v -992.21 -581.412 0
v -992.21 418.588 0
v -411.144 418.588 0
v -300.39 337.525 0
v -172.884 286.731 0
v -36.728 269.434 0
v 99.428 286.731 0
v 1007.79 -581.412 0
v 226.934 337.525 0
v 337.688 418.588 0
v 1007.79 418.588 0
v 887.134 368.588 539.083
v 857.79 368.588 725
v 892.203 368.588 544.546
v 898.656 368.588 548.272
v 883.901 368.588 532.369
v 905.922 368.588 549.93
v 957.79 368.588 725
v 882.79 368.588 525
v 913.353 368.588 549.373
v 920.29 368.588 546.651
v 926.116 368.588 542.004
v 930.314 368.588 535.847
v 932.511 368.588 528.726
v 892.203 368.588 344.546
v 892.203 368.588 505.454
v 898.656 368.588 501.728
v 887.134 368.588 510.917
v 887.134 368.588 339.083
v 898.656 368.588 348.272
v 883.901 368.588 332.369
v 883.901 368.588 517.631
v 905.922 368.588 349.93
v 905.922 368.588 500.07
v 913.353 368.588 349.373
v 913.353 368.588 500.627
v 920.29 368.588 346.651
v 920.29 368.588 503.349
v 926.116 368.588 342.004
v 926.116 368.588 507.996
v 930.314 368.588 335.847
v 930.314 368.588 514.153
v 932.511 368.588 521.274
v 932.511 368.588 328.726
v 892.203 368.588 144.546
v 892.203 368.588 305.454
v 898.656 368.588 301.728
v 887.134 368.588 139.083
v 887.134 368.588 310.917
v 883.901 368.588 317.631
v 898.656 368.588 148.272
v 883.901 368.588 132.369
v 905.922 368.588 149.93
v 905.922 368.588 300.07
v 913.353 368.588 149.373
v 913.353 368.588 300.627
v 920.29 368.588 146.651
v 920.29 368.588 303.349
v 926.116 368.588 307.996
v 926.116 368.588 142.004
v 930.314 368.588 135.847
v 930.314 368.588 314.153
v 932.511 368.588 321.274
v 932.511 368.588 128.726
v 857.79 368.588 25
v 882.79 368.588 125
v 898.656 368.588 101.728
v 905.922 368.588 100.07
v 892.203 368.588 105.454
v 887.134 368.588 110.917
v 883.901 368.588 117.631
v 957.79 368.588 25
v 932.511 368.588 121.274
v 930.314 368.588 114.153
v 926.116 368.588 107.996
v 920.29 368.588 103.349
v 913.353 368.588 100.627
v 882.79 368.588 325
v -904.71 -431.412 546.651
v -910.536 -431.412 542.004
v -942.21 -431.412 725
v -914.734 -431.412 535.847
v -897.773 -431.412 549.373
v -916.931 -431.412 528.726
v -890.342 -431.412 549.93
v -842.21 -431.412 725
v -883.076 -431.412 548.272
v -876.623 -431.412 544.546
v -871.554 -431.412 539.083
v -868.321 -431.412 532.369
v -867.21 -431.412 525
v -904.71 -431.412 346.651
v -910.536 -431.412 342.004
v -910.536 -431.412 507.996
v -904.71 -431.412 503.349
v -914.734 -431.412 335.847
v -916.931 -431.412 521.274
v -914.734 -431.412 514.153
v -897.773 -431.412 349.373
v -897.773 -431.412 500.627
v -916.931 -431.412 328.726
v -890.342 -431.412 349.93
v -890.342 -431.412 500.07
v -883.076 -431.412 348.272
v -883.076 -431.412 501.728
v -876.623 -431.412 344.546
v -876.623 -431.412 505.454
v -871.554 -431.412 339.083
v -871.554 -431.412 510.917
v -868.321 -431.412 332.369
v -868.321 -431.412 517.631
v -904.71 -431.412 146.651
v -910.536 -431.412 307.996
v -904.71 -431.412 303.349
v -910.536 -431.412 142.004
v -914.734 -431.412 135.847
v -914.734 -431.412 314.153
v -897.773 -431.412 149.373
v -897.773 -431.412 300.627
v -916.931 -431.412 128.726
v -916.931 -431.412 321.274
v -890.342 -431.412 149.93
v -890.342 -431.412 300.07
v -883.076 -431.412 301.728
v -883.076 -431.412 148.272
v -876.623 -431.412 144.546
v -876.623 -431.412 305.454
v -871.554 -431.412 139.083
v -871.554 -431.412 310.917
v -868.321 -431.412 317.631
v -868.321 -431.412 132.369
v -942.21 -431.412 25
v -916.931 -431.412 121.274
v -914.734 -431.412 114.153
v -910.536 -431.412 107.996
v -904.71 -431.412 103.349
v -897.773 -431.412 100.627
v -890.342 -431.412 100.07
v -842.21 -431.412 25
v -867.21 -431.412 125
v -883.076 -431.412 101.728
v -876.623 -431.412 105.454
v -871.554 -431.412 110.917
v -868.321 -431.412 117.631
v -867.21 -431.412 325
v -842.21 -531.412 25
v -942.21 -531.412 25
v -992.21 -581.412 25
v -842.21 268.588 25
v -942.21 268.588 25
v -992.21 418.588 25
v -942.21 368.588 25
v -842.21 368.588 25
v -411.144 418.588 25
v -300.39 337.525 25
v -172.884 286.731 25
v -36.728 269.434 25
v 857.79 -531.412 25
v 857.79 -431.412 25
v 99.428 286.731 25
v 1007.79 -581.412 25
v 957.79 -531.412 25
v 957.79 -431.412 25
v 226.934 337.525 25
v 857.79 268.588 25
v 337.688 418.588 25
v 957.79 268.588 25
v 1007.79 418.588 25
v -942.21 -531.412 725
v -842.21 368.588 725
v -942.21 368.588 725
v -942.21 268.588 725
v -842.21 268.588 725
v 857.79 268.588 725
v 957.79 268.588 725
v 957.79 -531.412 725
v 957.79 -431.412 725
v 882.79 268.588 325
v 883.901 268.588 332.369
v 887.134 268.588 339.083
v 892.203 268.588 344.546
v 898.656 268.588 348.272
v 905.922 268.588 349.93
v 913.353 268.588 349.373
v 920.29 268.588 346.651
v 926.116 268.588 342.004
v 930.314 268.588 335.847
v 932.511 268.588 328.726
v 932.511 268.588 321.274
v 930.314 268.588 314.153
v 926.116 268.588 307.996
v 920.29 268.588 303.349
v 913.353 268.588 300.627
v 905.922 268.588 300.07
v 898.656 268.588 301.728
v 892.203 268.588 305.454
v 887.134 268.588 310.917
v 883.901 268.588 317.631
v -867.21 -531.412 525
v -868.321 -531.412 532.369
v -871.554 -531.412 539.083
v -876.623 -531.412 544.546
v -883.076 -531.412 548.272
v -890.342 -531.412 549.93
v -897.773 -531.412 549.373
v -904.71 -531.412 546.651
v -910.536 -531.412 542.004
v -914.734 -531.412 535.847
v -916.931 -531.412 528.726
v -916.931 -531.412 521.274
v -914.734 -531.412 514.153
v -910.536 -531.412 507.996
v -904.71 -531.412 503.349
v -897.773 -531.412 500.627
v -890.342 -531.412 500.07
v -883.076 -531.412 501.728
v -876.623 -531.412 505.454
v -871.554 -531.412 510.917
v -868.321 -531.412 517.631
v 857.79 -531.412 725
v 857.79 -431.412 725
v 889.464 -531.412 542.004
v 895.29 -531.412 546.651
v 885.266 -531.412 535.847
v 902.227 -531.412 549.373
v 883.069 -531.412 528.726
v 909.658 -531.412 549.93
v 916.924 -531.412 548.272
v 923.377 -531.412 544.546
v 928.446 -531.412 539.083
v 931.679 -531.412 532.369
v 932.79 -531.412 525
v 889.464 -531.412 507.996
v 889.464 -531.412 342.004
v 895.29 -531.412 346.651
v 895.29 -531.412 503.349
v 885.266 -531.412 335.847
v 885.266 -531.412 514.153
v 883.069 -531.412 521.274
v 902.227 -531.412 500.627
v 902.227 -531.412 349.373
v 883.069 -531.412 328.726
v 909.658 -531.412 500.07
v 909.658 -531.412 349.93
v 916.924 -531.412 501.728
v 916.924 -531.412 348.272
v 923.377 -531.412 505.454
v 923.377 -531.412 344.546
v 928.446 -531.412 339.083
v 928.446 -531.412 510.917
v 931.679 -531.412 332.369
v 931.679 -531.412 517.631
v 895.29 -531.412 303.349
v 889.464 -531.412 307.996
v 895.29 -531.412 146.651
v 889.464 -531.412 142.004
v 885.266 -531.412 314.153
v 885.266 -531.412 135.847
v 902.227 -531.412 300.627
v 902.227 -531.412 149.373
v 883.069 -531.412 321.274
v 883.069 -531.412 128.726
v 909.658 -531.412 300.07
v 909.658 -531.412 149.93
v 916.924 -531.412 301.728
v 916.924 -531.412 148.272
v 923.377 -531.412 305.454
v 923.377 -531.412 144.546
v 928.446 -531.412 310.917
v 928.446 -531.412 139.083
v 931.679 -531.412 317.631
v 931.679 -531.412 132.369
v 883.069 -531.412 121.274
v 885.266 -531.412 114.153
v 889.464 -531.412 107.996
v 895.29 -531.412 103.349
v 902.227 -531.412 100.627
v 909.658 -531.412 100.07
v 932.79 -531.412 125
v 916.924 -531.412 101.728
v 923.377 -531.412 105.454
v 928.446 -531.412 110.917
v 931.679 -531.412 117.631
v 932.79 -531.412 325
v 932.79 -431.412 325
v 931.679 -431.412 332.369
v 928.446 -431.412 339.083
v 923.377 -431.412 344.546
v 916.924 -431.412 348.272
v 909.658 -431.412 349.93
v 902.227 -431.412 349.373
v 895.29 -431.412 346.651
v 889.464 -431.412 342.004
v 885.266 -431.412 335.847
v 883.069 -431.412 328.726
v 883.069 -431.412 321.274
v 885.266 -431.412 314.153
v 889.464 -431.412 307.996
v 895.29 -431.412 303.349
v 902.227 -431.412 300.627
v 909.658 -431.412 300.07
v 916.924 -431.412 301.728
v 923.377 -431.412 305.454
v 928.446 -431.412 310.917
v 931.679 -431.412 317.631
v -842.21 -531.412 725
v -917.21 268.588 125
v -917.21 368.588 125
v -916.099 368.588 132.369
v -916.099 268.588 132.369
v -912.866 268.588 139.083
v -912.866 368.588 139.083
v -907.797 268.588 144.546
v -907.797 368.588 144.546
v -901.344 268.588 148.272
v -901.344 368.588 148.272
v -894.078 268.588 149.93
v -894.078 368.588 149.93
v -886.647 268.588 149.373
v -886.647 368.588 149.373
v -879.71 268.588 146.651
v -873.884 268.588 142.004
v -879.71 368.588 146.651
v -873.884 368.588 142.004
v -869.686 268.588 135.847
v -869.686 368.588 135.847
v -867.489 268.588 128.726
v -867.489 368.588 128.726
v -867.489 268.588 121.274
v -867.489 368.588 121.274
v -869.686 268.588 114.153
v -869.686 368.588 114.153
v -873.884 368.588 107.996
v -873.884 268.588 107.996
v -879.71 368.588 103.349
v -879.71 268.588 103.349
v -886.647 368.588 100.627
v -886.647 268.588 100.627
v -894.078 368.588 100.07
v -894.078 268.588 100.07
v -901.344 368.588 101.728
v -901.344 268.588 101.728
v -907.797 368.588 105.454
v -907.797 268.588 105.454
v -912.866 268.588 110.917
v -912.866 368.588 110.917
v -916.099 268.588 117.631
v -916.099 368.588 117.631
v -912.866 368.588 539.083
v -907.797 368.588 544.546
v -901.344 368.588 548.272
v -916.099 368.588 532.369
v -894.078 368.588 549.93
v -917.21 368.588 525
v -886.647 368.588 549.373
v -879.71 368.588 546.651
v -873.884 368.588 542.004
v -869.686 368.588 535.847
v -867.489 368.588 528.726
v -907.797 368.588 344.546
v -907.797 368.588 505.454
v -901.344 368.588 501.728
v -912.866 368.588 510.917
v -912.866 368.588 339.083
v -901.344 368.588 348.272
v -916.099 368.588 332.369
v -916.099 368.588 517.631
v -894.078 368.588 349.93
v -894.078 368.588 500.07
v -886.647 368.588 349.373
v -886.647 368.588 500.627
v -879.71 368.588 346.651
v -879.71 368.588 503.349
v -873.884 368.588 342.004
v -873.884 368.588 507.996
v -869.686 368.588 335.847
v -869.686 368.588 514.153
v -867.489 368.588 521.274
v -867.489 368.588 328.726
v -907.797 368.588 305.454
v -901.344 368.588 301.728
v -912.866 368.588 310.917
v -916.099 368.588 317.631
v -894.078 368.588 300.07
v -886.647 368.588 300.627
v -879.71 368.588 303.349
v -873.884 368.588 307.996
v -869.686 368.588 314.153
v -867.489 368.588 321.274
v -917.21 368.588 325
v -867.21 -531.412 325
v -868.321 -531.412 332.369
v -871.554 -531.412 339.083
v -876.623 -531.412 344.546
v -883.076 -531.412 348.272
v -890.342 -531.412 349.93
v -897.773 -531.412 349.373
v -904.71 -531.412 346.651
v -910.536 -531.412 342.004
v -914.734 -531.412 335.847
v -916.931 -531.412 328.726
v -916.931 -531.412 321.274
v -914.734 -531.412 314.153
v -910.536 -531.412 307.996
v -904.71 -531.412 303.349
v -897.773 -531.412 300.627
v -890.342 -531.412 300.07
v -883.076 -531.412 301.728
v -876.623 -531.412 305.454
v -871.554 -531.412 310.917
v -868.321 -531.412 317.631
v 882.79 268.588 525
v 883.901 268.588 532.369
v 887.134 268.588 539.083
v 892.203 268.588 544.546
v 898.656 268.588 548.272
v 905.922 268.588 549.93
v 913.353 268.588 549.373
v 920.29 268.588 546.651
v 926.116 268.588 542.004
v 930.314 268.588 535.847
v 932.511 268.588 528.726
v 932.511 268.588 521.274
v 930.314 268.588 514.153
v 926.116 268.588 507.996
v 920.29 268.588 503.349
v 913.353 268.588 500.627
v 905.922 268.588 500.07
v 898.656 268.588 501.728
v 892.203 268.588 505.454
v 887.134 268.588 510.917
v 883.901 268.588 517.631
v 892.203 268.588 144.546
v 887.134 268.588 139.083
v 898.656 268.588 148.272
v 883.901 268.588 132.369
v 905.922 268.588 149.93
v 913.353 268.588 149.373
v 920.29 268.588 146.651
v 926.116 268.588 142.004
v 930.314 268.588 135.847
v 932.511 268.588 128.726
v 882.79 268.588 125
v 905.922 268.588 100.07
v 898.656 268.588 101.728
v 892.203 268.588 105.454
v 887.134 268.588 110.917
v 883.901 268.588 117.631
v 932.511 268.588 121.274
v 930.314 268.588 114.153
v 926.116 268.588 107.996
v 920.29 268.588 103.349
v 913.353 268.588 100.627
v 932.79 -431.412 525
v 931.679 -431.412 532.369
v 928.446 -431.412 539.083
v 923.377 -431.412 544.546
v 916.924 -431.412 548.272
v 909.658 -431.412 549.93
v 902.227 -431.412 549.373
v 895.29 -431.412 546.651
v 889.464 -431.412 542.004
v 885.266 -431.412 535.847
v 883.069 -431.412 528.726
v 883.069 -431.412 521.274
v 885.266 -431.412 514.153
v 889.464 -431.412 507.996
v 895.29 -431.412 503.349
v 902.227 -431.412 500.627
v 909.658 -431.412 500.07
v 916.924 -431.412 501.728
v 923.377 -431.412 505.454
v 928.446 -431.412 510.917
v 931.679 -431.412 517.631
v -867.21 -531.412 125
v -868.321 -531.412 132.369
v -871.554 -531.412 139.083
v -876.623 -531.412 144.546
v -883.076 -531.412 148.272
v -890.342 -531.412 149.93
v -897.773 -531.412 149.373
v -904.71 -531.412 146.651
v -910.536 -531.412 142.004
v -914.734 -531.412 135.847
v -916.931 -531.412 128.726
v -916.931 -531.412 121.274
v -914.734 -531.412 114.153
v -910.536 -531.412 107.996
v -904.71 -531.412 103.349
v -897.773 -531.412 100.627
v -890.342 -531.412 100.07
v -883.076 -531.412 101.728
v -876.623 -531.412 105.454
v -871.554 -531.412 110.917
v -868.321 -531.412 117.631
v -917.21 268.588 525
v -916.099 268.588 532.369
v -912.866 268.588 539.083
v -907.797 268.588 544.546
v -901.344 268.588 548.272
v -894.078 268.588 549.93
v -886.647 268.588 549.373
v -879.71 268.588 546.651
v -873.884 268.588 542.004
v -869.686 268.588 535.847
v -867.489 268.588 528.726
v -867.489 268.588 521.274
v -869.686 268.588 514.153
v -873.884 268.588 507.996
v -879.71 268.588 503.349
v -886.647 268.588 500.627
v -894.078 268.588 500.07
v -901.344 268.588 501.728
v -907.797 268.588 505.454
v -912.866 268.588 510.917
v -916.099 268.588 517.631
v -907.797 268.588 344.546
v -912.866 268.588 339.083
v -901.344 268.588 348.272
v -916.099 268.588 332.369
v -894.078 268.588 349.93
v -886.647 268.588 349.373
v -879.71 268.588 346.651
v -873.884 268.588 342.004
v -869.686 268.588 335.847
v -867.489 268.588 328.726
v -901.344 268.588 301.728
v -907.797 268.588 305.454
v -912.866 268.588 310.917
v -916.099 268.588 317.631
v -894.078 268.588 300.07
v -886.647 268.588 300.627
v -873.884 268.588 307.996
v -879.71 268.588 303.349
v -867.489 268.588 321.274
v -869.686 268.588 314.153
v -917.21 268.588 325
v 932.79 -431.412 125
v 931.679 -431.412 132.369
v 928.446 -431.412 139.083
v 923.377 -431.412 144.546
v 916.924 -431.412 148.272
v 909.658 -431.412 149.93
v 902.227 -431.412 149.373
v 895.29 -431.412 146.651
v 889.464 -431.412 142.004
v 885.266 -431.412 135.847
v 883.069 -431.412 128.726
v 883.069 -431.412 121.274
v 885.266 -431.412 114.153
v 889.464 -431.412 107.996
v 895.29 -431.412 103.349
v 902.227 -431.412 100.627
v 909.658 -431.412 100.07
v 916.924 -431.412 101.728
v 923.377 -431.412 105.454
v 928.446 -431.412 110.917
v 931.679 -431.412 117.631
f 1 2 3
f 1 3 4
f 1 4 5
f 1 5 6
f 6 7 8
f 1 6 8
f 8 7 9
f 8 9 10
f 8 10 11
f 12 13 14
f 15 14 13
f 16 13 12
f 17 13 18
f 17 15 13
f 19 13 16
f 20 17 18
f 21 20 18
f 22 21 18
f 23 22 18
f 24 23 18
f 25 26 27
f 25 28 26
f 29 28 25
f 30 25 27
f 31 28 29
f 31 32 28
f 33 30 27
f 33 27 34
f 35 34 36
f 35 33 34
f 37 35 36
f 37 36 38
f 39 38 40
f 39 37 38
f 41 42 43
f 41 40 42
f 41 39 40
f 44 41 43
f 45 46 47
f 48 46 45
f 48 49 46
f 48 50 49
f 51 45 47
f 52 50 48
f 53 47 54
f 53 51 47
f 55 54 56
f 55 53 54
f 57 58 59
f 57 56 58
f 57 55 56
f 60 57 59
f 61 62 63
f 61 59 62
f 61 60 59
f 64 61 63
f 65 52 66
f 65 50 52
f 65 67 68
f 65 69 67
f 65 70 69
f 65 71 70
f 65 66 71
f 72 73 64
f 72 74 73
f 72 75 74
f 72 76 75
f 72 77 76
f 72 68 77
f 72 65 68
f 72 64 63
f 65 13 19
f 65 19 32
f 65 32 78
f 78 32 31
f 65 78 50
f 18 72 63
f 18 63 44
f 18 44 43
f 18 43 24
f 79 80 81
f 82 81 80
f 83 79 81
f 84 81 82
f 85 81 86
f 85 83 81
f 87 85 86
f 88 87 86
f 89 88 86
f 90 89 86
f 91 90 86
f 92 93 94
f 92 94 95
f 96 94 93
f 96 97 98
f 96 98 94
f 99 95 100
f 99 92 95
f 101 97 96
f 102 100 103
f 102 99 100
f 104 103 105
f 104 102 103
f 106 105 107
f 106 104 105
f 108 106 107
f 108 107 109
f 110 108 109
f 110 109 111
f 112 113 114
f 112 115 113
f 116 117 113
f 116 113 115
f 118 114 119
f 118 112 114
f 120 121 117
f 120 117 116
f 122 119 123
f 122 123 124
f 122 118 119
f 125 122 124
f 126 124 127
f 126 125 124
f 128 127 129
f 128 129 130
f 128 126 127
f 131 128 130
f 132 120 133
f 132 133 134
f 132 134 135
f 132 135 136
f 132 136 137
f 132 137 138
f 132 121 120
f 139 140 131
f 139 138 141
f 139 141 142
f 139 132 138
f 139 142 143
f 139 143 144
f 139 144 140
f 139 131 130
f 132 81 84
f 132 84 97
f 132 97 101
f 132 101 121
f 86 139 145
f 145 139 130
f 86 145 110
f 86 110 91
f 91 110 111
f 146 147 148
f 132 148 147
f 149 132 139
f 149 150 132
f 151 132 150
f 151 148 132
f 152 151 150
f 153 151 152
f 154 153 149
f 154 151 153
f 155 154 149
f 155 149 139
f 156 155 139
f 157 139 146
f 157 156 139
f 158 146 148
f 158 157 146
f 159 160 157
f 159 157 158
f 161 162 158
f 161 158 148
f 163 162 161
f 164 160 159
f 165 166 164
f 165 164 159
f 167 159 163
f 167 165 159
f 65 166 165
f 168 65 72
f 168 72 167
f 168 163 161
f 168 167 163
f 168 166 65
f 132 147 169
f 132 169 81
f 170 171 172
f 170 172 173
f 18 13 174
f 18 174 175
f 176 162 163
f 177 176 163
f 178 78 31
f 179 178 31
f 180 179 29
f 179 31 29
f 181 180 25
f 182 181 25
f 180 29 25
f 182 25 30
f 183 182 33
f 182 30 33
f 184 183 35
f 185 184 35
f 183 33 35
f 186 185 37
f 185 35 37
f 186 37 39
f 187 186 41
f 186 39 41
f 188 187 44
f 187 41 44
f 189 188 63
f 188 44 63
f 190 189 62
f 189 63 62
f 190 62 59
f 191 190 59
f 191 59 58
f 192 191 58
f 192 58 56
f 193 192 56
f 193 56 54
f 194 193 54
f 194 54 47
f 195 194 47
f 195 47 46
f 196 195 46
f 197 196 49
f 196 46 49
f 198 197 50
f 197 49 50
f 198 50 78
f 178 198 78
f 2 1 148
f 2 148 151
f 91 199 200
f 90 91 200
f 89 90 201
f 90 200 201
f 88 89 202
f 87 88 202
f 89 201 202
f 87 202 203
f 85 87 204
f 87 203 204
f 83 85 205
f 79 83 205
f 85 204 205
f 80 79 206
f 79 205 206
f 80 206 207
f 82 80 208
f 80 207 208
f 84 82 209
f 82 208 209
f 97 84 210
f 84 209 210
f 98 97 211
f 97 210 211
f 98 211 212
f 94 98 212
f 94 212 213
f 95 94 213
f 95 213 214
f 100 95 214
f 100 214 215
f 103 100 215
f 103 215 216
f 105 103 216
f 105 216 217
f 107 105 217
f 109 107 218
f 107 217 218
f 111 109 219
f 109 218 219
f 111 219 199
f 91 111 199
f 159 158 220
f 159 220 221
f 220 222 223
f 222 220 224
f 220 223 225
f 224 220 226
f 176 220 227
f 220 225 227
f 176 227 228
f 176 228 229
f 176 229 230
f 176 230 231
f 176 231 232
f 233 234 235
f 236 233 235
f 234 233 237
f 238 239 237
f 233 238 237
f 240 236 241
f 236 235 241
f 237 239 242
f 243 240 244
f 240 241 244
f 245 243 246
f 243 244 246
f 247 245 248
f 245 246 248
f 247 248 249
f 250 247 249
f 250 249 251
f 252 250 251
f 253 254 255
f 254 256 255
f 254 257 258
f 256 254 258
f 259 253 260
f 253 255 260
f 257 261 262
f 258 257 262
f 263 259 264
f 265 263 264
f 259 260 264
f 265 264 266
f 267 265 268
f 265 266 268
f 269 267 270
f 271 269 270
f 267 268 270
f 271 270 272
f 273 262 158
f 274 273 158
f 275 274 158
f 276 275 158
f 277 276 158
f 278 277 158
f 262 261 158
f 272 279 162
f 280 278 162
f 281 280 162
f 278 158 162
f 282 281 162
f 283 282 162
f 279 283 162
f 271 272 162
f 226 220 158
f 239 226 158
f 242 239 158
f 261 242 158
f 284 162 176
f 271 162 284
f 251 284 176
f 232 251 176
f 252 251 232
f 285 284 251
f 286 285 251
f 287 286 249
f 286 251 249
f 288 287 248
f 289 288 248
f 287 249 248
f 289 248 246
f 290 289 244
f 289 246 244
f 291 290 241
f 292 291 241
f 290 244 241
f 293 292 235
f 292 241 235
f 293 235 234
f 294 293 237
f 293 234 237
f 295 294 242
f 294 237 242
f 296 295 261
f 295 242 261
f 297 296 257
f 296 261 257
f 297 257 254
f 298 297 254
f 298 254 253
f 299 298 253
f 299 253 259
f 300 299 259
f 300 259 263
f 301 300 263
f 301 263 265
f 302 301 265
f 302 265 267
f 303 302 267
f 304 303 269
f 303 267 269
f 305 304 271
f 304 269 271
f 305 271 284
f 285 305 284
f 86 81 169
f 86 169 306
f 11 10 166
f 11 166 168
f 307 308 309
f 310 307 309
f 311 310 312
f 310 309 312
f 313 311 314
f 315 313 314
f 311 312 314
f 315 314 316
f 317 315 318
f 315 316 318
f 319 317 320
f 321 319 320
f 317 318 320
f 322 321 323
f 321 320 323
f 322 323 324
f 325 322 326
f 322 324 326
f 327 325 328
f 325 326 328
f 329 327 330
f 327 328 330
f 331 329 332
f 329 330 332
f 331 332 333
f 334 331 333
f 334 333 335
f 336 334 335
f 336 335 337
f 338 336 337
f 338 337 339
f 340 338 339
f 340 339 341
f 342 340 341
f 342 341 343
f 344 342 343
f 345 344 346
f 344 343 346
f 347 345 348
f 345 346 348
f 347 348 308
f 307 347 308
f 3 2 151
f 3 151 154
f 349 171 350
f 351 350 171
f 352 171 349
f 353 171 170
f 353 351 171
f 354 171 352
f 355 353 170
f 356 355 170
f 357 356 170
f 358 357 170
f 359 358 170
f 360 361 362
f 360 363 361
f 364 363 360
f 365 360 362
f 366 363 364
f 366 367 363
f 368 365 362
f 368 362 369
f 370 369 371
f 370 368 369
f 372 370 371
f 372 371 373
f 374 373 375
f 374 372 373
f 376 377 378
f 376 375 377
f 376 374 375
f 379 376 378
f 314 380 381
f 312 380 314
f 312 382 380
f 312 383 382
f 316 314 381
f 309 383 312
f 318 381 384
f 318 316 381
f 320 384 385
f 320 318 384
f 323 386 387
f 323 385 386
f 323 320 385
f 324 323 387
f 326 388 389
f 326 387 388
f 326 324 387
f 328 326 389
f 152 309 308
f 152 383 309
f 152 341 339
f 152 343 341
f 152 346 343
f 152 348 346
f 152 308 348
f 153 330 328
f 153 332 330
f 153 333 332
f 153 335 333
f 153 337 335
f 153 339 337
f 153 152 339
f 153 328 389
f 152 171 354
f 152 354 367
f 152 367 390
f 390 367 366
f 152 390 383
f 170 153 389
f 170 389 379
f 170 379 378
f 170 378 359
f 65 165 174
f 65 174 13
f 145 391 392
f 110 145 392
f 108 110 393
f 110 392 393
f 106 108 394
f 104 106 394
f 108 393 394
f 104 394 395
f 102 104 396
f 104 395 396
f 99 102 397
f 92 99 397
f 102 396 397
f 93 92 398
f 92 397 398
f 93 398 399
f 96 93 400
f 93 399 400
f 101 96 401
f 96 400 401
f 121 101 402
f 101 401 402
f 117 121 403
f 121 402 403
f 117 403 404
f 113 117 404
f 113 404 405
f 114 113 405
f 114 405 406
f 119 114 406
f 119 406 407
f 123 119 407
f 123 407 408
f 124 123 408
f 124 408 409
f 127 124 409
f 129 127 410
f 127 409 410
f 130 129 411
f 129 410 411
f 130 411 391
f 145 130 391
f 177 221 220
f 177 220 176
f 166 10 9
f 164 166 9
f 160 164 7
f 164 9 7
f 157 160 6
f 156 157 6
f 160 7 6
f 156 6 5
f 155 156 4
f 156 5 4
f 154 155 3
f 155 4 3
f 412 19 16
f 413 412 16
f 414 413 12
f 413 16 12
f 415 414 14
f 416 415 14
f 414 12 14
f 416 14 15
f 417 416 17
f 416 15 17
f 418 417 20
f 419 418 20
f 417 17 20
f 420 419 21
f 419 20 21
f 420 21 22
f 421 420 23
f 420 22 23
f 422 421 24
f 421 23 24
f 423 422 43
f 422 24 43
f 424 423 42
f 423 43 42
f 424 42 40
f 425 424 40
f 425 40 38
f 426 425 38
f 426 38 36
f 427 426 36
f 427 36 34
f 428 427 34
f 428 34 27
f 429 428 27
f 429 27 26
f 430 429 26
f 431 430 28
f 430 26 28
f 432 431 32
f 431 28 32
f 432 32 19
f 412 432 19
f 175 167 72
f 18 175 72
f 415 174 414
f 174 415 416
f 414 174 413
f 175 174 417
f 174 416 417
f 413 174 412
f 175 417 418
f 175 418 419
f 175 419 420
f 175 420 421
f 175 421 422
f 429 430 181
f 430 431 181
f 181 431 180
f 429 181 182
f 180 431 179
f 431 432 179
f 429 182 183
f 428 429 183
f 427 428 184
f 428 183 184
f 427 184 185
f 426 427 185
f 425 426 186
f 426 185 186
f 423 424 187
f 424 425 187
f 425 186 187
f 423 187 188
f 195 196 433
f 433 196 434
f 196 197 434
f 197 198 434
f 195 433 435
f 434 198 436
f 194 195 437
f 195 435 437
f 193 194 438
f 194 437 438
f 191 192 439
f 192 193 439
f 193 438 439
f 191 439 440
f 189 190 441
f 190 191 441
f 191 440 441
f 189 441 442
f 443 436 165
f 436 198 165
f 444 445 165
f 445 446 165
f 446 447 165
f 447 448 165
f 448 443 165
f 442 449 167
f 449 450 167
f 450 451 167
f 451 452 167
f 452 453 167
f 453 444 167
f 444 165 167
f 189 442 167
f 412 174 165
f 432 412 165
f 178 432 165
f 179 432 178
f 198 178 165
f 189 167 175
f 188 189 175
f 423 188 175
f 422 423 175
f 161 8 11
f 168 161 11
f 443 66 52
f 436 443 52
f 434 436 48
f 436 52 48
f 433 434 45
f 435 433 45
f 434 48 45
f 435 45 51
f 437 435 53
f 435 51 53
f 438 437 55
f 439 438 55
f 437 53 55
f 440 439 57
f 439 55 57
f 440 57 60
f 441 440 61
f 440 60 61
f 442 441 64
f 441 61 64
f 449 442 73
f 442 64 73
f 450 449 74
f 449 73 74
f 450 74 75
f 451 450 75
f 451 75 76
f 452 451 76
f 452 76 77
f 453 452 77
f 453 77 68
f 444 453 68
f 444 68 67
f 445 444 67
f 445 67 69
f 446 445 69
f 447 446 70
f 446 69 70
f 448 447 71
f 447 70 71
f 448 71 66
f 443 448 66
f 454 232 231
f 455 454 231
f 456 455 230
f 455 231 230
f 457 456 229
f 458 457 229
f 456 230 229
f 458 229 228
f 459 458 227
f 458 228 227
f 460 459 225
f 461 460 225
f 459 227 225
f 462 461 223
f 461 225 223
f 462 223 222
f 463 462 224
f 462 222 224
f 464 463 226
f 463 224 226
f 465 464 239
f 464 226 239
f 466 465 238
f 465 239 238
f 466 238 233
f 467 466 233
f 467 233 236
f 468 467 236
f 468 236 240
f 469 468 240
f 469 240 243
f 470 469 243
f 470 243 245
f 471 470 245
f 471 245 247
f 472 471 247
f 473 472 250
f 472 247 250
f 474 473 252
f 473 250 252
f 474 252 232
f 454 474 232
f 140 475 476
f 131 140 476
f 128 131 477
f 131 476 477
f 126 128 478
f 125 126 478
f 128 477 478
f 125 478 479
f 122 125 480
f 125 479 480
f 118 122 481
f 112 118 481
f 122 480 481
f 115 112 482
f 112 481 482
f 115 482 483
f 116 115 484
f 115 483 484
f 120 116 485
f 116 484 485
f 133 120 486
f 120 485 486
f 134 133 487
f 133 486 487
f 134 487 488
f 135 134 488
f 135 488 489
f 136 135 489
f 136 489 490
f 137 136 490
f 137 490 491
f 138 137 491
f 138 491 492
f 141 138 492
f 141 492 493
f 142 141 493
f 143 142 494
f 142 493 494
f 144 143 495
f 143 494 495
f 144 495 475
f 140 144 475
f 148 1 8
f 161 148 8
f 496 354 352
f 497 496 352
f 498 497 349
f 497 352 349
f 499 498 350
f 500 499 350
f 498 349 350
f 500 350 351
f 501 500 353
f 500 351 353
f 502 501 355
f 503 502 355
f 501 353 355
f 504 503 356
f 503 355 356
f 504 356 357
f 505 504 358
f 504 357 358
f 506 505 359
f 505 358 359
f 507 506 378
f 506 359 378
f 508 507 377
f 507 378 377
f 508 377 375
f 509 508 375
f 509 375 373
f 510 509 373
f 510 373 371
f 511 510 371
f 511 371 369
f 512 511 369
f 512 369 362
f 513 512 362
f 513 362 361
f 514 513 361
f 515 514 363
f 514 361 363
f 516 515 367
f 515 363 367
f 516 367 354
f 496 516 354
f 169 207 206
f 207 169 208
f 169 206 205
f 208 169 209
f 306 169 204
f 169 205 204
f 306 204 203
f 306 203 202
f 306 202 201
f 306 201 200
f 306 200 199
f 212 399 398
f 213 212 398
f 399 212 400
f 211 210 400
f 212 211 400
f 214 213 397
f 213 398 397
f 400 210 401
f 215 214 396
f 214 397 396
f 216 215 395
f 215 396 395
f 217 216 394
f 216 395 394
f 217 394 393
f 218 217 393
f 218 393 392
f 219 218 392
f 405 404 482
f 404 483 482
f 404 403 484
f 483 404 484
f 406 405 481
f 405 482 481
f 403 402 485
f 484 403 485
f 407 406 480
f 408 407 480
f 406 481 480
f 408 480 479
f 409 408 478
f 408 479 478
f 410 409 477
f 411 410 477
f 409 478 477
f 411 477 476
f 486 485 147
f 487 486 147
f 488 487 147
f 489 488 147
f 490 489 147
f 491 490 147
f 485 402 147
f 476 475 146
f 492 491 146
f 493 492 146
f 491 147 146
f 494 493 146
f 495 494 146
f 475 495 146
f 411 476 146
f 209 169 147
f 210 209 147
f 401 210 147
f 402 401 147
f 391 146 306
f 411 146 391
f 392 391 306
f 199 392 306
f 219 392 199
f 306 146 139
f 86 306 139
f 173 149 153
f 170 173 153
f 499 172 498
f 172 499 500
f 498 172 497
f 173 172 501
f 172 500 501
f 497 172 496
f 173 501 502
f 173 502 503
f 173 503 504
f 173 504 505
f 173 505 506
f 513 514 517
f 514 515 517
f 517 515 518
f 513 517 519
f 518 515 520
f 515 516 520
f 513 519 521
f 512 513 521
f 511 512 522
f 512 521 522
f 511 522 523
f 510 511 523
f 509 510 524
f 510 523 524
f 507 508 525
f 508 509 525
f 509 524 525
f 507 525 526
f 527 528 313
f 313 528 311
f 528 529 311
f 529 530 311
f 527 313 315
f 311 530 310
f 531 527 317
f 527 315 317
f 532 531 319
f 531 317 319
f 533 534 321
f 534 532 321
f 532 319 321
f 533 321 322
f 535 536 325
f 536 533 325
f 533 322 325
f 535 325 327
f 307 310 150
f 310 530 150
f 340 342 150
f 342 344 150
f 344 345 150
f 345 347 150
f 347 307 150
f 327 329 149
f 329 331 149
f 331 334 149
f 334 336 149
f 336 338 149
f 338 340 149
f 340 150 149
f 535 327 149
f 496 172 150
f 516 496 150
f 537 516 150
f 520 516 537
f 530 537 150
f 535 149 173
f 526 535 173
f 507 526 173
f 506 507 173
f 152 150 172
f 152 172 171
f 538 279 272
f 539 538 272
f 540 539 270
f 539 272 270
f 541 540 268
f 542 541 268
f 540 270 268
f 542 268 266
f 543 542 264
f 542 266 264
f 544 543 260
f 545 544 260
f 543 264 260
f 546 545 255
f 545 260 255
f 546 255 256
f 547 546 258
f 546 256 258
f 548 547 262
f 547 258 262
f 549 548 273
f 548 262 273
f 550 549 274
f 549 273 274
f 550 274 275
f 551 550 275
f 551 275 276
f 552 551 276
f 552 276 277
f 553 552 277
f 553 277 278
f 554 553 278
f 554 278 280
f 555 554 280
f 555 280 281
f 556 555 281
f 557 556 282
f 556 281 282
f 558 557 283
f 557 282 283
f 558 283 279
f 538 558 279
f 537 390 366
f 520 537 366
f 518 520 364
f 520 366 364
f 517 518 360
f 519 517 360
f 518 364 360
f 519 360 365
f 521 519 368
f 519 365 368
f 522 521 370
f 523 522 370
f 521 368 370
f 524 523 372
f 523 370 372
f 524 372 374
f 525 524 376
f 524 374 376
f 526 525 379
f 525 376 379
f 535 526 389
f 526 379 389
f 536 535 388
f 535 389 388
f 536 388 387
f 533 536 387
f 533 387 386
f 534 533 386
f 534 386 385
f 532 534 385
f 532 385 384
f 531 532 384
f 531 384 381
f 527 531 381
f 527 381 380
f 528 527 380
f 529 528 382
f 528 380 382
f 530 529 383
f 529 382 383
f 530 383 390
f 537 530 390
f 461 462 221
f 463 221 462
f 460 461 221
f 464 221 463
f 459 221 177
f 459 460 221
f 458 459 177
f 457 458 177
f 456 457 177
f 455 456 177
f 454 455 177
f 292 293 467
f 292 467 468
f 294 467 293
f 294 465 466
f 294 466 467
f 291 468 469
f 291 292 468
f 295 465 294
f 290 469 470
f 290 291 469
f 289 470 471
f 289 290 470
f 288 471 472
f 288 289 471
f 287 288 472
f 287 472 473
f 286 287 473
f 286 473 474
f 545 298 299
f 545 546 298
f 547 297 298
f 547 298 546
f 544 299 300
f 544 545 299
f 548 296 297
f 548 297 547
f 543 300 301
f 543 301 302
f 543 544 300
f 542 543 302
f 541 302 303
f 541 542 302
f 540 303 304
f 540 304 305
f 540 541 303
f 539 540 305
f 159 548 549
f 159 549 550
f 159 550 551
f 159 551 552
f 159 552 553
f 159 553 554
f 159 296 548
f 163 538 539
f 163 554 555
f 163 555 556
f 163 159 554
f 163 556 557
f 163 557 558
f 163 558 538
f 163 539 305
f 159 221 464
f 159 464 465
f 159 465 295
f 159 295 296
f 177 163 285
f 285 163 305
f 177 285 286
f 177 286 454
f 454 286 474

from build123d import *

# Parameters (mm, degrees)
F0_W      = 2000
F0_H      = 1000
F1_DEPTH  = 25
F2_W      = 100
F2_H      = 100
F3_DEPTH  = 700
F4_R      = 25
F5_DEPTH  = 100
F6_W      = 100
F6_H      = 100
F7_DEPTH  = 700
F8_R      = 25
F9_DEPTH  = 100
F10_W     = 100
F10_H     = 100
F11_DEPTH = 700
F12_R     = 25
F13_DEPTH = 100
F14_W     = 100
F14_H     = 100
F15_DEPTH = 700
F16_R     = 25
F17_DEPTH = 100
F19_DEPTH = 25


with BuildPart() as f1:
    # F0 (on Top) → F1 (new body)
    with BuildSketch(Plane.XY):
        with Locations((7.790016, -81.412016)):
            Rectangle(F0_W, F0_H)
    extrude(amount=F1_DEPTH)

    # F2 (on face) → F3 (join)
    with BuildSketch(Plane.XY.offset(25)):
        with Locations((-892.209984, 318.587984)):
            Rectangle(F2_W, F2_H)
    extrude(amount=F3_DEPTH)

    # F4 (on face) → F5 (cut)
    with BuildSketch(Plane(origin=(0, 368.587984, 0), x_dir=(-1, 0, 0), z_dir=(0, 1, 0))):
        with Locations((892.209984, 125)):
            Circle(F4_R)
        with Locations((892.209984, 325)):
            Circle(F4_R)
        with Locations((892.209984, 525)):
            Circle(F4_R)
    extrude(amount=-F5_DEPTH, mode=Mode.SUBTRACT)

    # F6 (on face) → F7 (join)
    with BuildSketch(Plane.XY.offset(25)):
        with Locations((907.790016, 318.587984)):
            Rectangle(F6_W, F6_H)
    extrude(amount=F7_DEPTH)

    # F8 (on face) → F9 (cut)
    with BuildSketch(Plane(origin=(0, 368.587984, 0), x_dir=(-1, 0, 0), z_dir=(0, 1, 0))):
        with Locations((-907.790016, 125)):
            Circle(F8_R)
        with Locations((-907.790016, 325)):
            Circle(F8_R)
        with Locations((-907.790016, 525)):
            Circle(F8_R)
    extrude(amount=-F9_DEPTH, mode=Mode.SUBTRACT)

    # F10 (on face) → F11 (join)
    with BuildSketch(Plane.XY.offset(25)):
        with Locations((-892.209984, -481.412016)):
            Rectangle(F10_W, F10_H)
    extrude(amount=F11_DEPTH)

    # F12 (on face) → F13 (cut)
    with BuildSketch(Plane.XZ.offset(531.412016)):
        with Locations((-892.209984, 525)):
            Circle(F12_R)
        with Locations((-892.209984, 325)):
            Circle(F12_R)
        with Locations((-892.209984, 125)):
            Circle(F12_R)
    extrude(amount=-F13_DEPTH, mode=Mode.SUBTRACT)

    # F14 (on face) → F15 (join)
    with BuildSketch(Plane.XY.offset(25)):
        with Locations((907.790016, -481.412016)):
            Rectangle(F14_W, F14_H)
    extrude(amount=F15_DEPTH)

    # F16 (on face) → F17 (cut)
    with BuildSketch(Plane.XZ.offset(531.412016)):
        with Locations((907.790016, 525)):
            Circle(F16_R)
        with Locations((907.790016, 325)):
            Circle(F16_R)
        with Locations((907.790016, 125)):
            Circle(F16_R)
    extrude(amount=-F17_DEPTH, mode=Mode.SUBTRACT)

    # F18 (on face) → F19 (cut)
    with BuildSketch(Plane(origin=(0, 0, 0), x_dir=(1, 0, 0), z_dir=(0, 0, -1))):
        with BuildLine():
            Line((-411.143931, -418.587984), (337.688116, -418.587984))
            ThreePointArc((337.688116, -418.587984), (-36.727907, -269.433703), (-411.143931, -418.587984))
        make_face()
    extrude(amount=-F19_DEPTH, mode=Mode.SUBTRACT)


solid = f1.part
